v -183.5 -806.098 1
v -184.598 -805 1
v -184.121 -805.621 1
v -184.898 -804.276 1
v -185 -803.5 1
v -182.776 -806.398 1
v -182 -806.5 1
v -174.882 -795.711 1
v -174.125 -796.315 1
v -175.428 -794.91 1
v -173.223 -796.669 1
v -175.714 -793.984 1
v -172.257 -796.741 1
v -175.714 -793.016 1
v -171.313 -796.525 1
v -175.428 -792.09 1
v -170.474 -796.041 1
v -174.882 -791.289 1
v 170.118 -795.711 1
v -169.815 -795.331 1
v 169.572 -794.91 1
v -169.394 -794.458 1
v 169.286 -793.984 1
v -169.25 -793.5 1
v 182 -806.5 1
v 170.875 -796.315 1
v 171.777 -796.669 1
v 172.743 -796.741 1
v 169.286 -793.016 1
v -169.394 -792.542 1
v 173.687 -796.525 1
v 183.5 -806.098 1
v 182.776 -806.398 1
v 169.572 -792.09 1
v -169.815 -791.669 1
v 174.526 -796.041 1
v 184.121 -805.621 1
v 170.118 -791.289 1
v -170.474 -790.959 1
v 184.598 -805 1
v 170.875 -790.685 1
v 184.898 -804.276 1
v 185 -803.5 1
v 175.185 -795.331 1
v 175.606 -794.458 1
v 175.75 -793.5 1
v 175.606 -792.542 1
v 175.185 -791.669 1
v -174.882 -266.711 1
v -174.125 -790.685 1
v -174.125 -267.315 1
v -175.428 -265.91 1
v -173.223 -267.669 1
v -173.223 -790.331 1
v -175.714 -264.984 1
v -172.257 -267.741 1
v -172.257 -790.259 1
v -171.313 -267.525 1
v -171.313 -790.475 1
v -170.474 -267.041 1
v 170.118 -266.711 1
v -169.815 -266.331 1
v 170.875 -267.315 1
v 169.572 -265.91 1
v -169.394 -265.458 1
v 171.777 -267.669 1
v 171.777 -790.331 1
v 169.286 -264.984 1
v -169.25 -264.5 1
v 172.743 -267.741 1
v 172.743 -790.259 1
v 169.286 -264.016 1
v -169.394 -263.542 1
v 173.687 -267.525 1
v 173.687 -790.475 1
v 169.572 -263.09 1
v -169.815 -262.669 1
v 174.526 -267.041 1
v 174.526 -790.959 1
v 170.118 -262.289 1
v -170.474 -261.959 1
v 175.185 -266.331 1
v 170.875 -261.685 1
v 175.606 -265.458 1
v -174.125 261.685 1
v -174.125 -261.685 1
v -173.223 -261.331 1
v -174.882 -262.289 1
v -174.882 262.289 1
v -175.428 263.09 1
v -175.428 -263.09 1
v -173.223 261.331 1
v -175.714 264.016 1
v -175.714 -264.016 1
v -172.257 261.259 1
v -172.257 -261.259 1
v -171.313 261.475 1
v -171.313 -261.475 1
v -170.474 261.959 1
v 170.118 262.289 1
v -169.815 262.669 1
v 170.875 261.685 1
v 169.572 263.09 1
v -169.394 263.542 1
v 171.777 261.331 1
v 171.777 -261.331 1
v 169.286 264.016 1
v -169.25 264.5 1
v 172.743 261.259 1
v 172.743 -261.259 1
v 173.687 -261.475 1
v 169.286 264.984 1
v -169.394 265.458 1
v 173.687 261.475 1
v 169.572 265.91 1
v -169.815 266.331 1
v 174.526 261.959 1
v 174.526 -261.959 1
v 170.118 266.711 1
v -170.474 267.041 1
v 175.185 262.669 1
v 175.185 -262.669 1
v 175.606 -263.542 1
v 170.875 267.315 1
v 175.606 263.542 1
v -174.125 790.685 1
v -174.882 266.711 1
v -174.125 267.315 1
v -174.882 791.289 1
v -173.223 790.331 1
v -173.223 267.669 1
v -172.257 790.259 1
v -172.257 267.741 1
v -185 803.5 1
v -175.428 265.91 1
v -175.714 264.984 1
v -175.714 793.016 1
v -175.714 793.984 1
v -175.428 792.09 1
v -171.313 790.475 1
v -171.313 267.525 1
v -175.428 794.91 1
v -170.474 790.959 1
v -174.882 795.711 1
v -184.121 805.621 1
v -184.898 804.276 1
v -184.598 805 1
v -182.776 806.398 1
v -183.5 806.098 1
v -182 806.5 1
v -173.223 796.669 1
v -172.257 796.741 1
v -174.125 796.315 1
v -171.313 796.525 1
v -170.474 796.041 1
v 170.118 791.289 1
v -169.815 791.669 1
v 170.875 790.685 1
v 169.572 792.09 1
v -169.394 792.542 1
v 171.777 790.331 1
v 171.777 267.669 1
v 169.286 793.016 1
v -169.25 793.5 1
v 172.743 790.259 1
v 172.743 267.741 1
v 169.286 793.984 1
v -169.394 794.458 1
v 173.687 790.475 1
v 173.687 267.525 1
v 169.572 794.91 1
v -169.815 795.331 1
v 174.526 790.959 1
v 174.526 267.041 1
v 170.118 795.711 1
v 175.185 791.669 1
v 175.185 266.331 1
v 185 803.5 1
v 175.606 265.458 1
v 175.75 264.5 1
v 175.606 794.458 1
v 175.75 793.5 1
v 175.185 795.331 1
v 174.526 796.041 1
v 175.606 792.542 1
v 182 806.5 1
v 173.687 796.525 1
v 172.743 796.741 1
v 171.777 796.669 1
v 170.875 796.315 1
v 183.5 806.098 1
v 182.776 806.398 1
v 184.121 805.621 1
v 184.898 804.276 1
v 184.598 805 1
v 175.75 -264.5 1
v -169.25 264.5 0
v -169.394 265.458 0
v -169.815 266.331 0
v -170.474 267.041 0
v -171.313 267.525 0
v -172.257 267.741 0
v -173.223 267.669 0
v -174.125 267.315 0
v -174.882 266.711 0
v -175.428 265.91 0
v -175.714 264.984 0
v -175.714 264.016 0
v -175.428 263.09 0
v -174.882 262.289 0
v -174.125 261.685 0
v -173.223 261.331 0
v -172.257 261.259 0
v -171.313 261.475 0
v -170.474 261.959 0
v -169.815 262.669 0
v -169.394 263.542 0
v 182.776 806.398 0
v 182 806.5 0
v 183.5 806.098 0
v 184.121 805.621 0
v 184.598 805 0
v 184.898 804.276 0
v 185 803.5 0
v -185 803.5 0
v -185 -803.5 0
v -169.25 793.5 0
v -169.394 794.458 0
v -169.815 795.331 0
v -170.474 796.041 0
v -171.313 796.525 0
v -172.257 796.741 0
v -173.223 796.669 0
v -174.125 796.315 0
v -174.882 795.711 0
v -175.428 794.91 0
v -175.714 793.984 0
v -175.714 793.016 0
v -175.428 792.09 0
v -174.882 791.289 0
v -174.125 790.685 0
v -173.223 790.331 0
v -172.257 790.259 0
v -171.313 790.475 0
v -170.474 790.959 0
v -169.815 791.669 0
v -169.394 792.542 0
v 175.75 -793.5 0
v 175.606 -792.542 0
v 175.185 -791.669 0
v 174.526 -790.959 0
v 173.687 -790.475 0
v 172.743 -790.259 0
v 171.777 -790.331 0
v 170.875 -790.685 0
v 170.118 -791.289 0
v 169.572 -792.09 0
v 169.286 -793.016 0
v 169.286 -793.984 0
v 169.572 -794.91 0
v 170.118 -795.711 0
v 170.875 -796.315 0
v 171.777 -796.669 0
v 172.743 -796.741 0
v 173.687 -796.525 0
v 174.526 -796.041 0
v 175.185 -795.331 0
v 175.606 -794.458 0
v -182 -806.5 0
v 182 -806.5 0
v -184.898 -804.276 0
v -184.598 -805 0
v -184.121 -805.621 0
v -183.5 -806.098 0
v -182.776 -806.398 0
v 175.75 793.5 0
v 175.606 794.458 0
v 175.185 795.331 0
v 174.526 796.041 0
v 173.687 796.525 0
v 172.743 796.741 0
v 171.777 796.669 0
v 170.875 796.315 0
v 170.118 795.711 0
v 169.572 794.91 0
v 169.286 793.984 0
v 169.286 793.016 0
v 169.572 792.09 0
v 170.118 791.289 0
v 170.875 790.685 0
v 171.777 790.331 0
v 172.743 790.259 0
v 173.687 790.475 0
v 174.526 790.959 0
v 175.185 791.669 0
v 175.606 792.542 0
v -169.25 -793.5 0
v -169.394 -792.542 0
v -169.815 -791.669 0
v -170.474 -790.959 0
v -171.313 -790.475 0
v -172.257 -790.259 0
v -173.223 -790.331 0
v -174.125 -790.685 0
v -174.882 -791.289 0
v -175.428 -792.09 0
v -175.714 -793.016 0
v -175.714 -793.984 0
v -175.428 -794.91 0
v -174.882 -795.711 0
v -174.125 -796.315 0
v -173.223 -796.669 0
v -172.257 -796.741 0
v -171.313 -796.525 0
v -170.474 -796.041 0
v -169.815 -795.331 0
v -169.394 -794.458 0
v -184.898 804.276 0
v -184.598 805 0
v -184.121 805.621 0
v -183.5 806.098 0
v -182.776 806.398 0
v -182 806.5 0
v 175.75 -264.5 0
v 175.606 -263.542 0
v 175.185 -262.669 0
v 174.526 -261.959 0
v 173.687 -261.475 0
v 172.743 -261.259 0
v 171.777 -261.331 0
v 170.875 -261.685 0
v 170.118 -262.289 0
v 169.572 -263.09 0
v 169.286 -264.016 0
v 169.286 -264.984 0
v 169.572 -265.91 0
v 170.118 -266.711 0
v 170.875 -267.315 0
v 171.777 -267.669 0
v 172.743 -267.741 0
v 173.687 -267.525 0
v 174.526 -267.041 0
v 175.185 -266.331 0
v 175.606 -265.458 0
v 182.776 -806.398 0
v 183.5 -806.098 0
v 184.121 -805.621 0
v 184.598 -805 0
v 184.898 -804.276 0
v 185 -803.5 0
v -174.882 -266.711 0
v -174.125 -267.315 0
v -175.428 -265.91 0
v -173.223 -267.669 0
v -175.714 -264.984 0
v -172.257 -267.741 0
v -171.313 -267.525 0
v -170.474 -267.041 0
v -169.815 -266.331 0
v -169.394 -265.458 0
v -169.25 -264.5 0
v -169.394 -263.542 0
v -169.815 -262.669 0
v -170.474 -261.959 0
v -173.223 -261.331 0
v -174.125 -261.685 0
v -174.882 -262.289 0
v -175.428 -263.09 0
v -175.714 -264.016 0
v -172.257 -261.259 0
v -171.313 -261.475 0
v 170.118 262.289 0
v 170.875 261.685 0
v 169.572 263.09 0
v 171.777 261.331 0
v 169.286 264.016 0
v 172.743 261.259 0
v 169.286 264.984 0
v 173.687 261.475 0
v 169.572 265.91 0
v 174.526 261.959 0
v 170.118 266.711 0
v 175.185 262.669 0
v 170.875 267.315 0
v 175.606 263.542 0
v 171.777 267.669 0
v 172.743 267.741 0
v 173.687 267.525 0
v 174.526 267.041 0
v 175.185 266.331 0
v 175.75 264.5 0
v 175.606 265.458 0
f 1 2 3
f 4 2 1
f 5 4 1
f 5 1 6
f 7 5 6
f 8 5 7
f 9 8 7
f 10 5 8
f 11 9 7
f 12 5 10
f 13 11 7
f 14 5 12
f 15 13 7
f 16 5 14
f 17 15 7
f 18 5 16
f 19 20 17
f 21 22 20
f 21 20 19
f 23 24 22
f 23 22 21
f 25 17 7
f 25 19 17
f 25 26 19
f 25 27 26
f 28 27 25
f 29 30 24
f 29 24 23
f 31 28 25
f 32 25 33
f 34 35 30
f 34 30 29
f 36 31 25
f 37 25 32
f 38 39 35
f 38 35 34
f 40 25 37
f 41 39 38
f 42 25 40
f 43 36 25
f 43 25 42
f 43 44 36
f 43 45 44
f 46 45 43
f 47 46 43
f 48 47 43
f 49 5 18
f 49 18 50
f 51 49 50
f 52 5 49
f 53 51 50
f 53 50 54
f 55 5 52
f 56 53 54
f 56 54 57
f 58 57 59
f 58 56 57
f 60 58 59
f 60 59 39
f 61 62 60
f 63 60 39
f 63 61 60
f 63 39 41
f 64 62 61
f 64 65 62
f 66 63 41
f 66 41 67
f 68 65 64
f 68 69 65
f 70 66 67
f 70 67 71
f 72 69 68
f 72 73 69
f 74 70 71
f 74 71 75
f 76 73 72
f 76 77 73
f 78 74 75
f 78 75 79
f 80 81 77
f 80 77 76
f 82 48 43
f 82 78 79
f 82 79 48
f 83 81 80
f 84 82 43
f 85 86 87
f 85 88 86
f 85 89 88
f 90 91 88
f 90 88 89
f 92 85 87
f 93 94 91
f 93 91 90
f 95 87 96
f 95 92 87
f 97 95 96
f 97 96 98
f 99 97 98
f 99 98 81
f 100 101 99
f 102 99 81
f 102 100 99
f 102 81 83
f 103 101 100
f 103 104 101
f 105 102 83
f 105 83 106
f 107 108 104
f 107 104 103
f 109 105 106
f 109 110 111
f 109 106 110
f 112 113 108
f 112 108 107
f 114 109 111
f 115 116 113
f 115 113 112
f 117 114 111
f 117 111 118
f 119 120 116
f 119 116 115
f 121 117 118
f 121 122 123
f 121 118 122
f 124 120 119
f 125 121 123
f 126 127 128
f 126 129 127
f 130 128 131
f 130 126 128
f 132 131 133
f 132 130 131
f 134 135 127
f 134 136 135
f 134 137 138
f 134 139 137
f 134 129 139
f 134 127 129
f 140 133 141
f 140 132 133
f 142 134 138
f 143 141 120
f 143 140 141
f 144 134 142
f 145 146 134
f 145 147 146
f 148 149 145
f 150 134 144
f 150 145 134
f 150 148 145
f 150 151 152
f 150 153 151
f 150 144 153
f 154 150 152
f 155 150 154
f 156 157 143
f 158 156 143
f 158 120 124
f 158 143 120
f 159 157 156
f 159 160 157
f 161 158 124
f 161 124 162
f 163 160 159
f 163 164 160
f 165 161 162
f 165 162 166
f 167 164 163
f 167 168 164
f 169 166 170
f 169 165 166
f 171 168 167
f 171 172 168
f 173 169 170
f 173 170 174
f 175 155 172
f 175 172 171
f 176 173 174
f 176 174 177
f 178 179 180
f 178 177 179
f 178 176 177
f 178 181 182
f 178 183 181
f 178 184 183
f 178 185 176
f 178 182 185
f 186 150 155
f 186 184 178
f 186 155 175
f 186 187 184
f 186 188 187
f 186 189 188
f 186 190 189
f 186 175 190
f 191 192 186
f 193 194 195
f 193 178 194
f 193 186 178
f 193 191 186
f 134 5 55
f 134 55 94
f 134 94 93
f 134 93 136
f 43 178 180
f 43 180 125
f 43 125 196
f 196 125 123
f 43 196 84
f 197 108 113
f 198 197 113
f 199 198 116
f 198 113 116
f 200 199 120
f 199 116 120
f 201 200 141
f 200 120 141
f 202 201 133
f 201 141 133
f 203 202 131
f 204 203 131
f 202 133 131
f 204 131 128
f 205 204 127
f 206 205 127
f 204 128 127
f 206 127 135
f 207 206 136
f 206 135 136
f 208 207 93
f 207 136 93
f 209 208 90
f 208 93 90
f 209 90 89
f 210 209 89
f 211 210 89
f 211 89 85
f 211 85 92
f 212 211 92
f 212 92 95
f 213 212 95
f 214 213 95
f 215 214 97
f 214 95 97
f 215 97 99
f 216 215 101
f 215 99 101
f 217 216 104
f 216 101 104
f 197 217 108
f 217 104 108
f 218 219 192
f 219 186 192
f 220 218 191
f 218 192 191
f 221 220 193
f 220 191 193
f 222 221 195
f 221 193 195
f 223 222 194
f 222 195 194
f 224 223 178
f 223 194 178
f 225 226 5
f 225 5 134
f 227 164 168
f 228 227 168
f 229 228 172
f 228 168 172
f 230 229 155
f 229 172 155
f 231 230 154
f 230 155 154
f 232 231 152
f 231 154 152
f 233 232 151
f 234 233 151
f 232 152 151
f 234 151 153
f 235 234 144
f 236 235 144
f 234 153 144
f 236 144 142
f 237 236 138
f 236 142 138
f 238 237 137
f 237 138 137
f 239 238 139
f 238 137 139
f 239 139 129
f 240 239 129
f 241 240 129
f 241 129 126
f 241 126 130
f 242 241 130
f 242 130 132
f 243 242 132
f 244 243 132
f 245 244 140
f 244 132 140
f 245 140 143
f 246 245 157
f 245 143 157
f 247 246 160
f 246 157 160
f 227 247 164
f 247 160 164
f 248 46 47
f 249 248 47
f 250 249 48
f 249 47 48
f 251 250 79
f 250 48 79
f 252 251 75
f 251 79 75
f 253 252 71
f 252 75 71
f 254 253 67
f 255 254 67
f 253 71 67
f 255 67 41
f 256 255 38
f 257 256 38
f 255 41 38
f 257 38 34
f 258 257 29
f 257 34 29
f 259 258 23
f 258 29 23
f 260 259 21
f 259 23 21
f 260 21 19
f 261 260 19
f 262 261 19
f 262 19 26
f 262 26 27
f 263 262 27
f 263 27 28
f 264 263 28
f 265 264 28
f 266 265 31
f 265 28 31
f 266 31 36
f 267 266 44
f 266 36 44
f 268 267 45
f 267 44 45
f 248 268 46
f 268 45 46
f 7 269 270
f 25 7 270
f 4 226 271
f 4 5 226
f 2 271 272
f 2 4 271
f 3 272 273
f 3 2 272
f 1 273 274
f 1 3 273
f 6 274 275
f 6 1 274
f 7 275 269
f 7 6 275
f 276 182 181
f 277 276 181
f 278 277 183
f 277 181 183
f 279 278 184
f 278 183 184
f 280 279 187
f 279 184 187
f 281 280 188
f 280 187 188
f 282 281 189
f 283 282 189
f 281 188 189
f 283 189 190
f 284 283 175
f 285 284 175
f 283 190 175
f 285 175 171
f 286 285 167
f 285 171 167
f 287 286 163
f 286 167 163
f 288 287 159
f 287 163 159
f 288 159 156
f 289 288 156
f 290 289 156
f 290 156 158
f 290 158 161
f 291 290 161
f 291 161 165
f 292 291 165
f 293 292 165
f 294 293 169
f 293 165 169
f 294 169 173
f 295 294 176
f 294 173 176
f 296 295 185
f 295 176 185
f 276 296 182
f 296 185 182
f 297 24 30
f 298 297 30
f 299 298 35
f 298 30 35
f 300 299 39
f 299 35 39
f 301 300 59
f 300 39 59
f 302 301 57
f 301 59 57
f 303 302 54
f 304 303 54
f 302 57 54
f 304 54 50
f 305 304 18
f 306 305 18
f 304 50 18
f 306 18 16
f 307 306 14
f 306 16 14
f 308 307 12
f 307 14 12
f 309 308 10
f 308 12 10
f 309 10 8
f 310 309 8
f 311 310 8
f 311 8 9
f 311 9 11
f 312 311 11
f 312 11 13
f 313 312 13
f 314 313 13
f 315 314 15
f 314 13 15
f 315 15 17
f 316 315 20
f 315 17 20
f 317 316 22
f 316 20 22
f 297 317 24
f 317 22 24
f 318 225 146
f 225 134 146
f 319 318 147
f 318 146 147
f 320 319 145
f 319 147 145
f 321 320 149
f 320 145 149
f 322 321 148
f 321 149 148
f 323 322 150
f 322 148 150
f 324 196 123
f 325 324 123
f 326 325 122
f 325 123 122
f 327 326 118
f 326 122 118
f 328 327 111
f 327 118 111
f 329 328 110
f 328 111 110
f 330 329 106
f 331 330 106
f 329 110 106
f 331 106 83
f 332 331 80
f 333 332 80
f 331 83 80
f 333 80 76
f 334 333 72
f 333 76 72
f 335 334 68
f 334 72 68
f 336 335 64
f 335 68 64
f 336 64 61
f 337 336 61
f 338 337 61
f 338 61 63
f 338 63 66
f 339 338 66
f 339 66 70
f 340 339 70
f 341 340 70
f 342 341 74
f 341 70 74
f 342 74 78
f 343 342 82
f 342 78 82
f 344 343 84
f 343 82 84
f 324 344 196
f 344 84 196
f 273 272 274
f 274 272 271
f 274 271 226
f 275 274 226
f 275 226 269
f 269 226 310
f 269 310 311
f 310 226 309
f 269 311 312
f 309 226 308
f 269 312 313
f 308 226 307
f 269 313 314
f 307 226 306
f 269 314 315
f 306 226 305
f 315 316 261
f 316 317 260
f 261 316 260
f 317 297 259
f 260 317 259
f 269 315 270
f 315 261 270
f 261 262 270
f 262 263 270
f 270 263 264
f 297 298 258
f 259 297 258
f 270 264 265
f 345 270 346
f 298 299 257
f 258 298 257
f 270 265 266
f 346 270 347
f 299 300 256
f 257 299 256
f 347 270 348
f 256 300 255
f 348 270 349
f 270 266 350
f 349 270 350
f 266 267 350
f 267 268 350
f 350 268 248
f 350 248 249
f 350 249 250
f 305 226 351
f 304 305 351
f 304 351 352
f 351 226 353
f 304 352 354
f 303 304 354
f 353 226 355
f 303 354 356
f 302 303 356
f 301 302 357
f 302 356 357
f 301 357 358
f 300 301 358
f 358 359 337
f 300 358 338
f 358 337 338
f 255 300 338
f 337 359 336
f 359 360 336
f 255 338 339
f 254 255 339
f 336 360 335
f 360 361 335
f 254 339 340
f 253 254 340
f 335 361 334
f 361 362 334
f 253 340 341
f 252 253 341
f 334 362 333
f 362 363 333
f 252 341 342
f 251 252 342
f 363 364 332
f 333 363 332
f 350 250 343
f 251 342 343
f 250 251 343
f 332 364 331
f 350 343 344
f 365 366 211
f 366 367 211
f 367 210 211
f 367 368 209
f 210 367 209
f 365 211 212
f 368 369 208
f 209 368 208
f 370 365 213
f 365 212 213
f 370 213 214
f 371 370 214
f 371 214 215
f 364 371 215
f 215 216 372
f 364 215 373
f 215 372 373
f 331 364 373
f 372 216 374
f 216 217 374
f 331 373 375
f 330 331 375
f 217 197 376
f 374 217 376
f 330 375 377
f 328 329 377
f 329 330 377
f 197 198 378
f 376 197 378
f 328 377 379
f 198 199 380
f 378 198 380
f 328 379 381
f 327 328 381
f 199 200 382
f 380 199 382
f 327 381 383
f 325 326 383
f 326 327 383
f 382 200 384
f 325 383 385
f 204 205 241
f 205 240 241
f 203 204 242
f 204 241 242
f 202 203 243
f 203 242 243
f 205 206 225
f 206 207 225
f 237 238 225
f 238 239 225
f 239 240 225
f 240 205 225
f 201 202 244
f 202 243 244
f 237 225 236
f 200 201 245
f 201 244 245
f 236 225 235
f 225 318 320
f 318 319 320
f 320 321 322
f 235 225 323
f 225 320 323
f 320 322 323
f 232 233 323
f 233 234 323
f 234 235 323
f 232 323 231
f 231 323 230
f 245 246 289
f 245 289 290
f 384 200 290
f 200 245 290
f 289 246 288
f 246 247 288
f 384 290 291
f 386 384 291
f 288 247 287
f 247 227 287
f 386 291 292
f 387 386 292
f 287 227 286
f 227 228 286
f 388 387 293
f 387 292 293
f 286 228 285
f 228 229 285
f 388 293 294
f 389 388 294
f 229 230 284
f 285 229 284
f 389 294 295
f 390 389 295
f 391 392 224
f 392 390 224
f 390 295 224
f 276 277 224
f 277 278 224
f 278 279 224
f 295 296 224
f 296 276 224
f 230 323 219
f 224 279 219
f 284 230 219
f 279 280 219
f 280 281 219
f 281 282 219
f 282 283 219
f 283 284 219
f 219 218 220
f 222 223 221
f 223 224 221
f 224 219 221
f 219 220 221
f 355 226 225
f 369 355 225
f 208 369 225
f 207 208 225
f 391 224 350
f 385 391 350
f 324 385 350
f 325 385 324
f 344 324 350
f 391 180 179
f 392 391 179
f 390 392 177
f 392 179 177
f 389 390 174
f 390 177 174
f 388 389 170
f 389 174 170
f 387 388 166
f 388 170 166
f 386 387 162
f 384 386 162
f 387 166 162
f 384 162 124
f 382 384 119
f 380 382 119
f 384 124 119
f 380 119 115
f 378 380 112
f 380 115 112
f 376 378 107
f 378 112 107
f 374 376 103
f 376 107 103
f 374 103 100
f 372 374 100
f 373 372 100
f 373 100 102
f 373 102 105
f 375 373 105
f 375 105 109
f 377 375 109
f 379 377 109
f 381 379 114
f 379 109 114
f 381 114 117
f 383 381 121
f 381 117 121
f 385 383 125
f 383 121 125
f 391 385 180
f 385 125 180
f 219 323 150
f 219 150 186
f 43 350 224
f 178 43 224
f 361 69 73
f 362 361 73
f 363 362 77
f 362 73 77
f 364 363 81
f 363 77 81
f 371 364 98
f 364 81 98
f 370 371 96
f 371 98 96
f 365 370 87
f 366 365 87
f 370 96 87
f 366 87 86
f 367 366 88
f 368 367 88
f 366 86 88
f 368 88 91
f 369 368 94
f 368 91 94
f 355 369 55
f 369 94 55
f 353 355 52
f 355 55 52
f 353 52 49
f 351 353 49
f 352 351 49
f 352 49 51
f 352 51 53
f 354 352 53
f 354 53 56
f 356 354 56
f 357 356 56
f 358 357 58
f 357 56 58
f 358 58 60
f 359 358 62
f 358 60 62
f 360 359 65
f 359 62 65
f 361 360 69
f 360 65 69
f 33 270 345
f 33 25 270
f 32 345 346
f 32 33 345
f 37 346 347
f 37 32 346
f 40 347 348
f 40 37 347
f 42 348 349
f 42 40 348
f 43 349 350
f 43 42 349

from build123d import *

# Parameters (mm, degrees)
SKETCH1_W           = 370
SKETCH1_H           = 1613
BOSS_EXTRUDE1_DEPTH = 1
SKETCH2_R           = 3.25
CUT_EXTRUDE1_DEPTH  = 1
LPATTERN1_COUNT     = 4
LPATTERN1_PITCH     = 529
FILLET1_R           = 3


with BuildPart() as part:
    # Sketch1 → Boss-Extrude1 (new body)
    with BuildSketch(Plane.XY):
        Rectangle(SKETCH1_W, SKETCH1_H)
    extrude(amount=BOSS_EXTRUDE1_DEPTH)

    # Sketch2 → Cut-Extrude1 (cut)
    with BuildSketch(Plane.XY.offset(1)):
        with Locations((-172.5, -793.5)):
            Circle(SKETCH2_R)
        with Locations((172.5, -793.5)):
            Circle(SKETCH2_R)
    cut_extrude1 = extrude(amount=-CUT_EXTRUDE1_DEPTH, mode=Mode.SUBTRACT)

    # LPattern1: Cut-Extrude1 ×4
    with Locations(*[(0, i * LPATTERN1_PITCH, 0) for i in range(1, LPATTERN1_COUNT)]):
        add(cut_extrude1, mode=Mode.SUBTRACT)

    # Fillet1
    fillet1_edges = [part.edges().sort_by_distance(p)[0] for p in [
        (185, -806.5, 0.5),
        (-185, -806.5, 0.5),
        (-185, 806.5, 0.5),
        (185, 806.5, 0.5),
    ]]
    fillet(fillet1_edges, radius=FILLET1_R)


solid = part.part
